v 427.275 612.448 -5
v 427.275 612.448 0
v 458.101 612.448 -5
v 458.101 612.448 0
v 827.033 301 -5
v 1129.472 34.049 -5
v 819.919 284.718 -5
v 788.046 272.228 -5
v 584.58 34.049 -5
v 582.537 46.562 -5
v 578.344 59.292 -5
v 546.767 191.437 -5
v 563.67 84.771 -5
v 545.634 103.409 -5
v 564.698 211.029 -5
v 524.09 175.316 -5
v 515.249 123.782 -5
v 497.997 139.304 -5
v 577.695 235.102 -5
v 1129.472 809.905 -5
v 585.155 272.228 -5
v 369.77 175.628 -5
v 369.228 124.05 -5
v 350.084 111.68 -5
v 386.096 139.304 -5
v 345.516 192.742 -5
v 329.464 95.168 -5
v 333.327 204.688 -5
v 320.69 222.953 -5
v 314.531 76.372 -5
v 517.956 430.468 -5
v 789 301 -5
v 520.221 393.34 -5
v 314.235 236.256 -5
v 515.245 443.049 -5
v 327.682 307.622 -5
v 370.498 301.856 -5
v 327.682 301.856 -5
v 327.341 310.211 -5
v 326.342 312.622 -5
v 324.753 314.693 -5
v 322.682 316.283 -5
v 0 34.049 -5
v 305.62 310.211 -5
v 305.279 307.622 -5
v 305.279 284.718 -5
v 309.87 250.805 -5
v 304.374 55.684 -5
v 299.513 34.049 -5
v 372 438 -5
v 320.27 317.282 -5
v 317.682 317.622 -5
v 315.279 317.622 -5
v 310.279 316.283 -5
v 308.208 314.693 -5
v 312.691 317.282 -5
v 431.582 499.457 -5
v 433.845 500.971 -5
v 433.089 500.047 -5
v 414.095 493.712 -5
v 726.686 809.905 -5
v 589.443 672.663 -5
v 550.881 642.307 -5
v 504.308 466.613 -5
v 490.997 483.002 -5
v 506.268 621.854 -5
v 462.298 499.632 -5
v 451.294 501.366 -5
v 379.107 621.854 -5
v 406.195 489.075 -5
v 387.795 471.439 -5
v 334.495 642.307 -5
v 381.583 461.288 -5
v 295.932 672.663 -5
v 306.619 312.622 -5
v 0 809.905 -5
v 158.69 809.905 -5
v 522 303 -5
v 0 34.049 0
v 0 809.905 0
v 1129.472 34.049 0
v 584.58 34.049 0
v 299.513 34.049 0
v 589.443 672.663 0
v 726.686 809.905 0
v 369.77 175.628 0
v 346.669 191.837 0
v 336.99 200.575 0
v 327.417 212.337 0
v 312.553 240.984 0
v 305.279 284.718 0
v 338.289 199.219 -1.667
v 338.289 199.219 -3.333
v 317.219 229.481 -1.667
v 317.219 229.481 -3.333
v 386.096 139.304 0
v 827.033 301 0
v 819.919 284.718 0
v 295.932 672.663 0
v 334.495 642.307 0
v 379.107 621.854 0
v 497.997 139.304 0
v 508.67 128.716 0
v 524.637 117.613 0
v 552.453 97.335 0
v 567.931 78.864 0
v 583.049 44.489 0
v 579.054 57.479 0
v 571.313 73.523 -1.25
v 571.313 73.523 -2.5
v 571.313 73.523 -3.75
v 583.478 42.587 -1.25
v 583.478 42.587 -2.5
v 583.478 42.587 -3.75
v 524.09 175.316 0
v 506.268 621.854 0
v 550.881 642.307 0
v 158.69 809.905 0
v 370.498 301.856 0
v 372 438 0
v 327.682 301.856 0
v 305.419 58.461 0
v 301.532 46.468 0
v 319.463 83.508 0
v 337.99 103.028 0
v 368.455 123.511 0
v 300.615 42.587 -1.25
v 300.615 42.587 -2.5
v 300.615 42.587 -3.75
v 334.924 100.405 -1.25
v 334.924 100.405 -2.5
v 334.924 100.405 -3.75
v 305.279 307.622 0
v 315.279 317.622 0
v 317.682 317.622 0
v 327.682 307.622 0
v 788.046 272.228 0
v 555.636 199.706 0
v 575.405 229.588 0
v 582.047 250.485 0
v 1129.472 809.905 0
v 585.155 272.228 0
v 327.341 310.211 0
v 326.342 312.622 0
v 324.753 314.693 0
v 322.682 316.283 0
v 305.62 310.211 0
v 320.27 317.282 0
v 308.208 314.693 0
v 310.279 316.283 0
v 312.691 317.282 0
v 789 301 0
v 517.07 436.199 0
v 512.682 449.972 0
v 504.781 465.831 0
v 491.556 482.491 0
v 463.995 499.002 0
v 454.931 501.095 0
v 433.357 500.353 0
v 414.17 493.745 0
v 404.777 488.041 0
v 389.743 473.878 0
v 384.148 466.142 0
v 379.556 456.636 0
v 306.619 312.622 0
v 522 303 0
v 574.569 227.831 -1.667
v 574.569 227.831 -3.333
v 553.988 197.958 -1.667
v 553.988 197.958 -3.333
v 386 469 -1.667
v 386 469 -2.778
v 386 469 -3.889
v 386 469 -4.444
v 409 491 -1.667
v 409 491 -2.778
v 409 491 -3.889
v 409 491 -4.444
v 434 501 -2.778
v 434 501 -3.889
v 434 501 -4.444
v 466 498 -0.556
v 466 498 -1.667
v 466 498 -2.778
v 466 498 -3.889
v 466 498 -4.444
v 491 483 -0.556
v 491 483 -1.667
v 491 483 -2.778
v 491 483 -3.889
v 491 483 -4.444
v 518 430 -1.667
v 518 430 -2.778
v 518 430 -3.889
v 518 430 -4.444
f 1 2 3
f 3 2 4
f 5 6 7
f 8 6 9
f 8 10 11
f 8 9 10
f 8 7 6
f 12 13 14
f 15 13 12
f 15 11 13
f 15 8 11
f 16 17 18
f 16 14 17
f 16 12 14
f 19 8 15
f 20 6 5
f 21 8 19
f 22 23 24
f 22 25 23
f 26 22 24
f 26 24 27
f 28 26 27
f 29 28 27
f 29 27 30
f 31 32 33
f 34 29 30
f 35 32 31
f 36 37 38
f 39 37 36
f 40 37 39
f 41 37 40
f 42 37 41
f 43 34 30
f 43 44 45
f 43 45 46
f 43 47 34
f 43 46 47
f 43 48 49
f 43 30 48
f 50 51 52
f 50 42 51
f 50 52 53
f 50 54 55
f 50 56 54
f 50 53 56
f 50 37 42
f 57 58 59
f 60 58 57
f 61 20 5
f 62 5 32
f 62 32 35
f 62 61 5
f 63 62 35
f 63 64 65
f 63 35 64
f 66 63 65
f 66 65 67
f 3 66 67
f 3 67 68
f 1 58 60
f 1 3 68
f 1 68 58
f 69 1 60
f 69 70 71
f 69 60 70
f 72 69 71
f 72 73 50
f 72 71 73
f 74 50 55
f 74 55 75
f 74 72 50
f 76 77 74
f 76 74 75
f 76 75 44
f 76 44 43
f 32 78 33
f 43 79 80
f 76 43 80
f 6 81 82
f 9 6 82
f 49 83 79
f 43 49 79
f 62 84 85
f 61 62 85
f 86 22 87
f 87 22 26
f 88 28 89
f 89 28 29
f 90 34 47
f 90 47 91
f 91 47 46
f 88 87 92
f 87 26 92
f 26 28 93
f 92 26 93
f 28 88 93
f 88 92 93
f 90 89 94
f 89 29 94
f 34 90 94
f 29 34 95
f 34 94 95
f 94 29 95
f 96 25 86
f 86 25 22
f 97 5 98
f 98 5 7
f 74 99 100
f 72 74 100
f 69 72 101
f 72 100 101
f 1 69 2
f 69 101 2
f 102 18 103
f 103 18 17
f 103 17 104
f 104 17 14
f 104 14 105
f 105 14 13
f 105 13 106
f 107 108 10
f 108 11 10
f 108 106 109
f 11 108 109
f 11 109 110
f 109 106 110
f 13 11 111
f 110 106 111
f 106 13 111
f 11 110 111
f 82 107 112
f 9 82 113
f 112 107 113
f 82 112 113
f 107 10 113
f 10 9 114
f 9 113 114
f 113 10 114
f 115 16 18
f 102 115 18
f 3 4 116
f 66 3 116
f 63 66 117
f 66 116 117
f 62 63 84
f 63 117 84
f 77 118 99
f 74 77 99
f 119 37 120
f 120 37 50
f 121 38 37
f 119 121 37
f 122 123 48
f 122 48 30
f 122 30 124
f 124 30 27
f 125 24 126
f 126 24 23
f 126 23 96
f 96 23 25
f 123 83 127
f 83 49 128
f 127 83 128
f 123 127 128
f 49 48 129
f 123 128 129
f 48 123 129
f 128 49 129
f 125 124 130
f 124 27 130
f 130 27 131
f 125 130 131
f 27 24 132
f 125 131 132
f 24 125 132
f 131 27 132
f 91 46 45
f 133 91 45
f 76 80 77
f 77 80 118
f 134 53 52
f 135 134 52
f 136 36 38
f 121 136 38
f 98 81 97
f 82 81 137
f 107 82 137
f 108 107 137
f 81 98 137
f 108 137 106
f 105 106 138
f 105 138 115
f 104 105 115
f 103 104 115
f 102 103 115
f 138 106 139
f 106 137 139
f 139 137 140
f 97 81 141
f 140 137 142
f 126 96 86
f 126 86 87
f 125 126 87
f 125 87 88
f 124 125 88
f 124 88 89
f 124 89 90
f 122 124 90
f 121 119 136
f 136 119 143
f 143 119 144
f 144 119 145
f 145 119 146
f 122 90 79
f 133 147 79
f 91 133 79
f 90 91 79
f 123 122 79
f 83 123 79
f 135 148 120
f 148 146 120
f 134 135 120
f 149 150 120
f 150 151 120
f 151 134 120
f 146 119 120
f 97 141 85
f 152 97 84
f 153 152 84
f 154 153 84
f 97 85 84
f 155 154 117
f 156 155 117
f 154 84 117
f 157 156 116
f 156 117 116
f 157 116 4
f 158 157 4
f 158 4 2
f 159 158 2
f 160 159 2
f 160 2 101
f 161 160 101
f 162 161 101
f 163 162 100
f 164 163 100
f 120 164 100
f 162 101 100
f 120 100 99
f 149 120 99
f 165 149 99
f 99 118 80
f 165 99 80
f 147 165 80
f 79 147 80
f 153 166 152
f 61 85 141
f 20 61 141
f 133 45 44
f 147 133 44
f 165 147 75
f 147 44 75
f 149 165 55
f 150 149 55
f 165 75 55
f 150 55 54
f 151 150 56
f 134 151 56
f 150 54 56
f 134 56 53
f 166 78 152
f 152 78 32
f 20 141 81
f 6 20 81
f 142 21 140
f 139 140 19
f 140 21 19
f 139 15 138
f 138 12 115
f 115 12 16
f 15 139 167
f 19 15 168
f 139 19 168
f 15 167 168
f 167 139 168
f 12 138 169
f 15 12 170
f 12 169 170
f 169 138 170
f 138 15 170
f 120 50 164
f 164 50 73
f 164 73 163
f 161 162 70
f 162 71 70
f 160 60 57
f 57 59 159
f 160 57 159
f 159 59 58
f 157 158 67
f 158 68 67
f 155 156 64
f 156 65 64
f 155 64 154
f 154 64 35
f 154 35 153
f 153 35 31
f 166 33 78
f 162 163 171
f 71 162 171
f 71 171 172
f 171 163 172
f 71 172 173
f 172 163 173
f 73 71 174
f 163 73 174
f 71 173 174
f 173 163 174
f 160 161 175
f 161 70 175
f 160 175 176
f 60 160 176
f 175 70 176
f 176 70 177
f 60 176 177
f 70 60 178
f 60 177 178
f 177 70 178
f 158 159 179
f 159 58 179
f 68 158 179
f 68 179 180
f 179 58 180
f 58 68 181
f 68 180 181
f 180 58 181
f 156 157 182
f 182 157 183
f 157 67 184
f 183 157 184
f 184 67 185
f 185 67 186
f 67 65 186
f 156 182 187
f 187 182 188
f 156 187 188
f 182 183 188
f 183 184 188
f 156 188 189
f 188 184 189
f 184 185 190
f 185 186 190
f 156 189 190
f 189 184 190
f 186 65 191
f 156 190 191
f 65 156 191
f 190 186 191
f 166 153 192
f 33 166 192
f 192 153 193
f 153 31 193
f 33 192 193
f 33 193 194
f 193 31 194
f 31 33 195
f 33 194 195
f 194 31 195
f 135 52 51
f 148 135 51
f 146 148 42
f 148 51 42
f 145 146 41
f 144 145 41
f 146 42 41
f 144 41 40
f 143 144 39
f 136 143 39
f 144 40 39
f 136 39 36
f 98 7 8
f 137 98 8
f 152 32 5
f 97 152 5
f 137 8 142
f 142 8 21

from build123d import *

# Parameters (mm, degrees)
BOSS_EXTRUDE1_DEPTH = 5
BOSS_EXTRUDE2_DEPTH = 5
CUT_EXTRUDE1_DEPTH  = 10


with BuildPart() as part:
    # Sketch1 → Boss-Extrude1 (new body)
    with BuildSketch(Plane.XY):
        with BuildLine():
            Line((370.497648791, 301.856182559), (372, 438))
            add(Edge.make_bspline(
                [(372, 438), (377.070612499, 448.141224997), (379.461430827, 459.737027004), (386, 469), (392.118159092, 477.667392046), (400.143712739, 485.158619041), (409, 491), (416.132300897, 495.704283571), (425.067091676, 496.82683667), (433, 500), (433.43768811, 500.175075244), (433.528840556, 501.015198692), (434, 501), (438.494427227, 500.855018477), (456.988046274, 503.340417023), (466, 498), (474.360530914, 493.04561131), (483.793567573, 489.520105529), (491, 483), (498.069480611, 476.603803257), (503.672468408, 468.494784236), (508, 460), (512.78479786, 450.607619016), (517.063759809, 440.499264994), (518, 430), (521.761891843, 387.813070049), (520.666666667, 345.333333333), (522, 303)],
                knots=[0, 0, 0, 0, 1, 1, 1, 2, 2, 2, 3, 3, 3, 4, 4, 4, 5, 5, 5, 6, 6, 6, 7, 7, 7, 8, 8, 8, 9, 9, 9, 9], degree=3))
            Line((522, 303), (789, 301))
            Line((789, 301), (827.03280719, 301))
            Line((827.03280719, 301), (819.918923577, 284.71793746))
            Line((819.918923577, 284.71793746), (788.046411506, 272.228043202))
            Line((788.046411506, 272.228043202), (585.155364104, 272.228043202))
            add(Edge.make_bspline(
                [(524.090153556, 175.31625705), (534.132772767, 182.776976105), (545.301104031, 188.967808356), (553.987887853, 197.958010428), (562.390275972, 206.653883218), (569.231762232, 216.980387762), (574.568753191, 227.830957202), (581.280416418, 241.476355602), (583.659025907, 256.921583072), (585.155364104, 272.228043202)],
                knots=[0.030911268, 0.030911268, 0.030911268, 0.030911268, 1, 1, 1, 2, 2, 2, 2.820581713, 2.820581713, 2.820581713, 2.820581713], degree=3))
            Line((524.090153556, 175.31625705), (497.996656044, 139.304186189))
            add(Edge.make_bspline(
                [(497.996656044, 139.304186189), (511.751798598, 122.15158093), (533.207187644, 114.760213321), (549.168786654, 100.404628372), (557.800622493, 92.641305125), (565.388182046, 83.506408445), (571.312683203, 73.52251823), (576.967291515, 63.993447834), (581.146310668, 53.41944041), (583.478086888, 42.587053902), (585.653758103, 32.479861233), (584.25512728, 21.924242773), (584.643647475, 11.592837208)],
                knots=[-0.601084915, -0.601084915, -0.601084915, -0.601084915, 1, 1, 1, 2, 2, 2, 3, 3, 3, 4, 4, 4, 4], degree=3))
            Line((584.643647475, 11.592837208), (537.046411506, 5.228043202))
            Line((537.046411506, 5.228043202), (347.046411506, 5.228043202))
            Line((347.046411506, 5.228043202), (299.449175536, 11.592837208))
            add(Edge.make_bspline(
                [(386.096166967, 139.304186189), (372.341024413, 122.15158093), (350.885635367, 114.760213321), (334.924036357, 100.404628372), (326.292200518, 92.641305125), (318.704640966, 83.506408445), (312.780139808, 73.52251823), (307.125531496, 63.993447834), (302.946512343, 53.41944041), (300.614736124, 42.587053902), (298.439064908, 32.479861233), (299.837695732, 21.924242773), (299.449175536, 11.592837208)],
                knots=[-0.601084915, -0.601084915, -0.601084915, -0.601084915, 1, 1, 1, 2, 2, 2, 3, 3, 3, 4, 4, 4, 4], degree=3))
            Line((386.096166967, 139.304186189), (369.769696723, 175.6280686))
            add(Edge.make_bspline(
                [(369.769696723, 175.6280686), (359.275993543, 183.491550102), (347.446772756, 189.833430008), (338.288587183, 199.218513107), (329.704053525, 208.015731849), (322.698000121, 218.47829637), (317.218632515, 229.481105391), (308.82128178, 246.343351742), (306.951710973, 265.954847126), (305.27920015, 284.71793746)],
                knots=[0, 0, 0, 0, 1, 1, 1, 2, 2, 2, 3, 3, 3, 3], degree=3))
            Line((305.27920015, 284.71793746), (305.27920015, 294.71793746))
            Line((305.27920015, 294.71793746), (305.27920015, 307.622403638))
            ThreePointArc((305.27920015, 307.622403638), (308.208132338, 314.69347145), (315.27920015, 317.622403638))
            Line((315.27920015, 317.622403638), (317.681970552, 317.622403638))
            ThreePointArc((317.681970552, 317.622403638), (324.753038364, 314.69347145), (327.681970552, 307.622403638))
            Line((327.681970552, 307.622403638), (327.681970552, 301.856182559))
            Line((327.681970552, 301.856182559), (370.497648791, 301.856182559))
        make_face()
        with BuildLine():
            ThreePointArc((406.611213578, 432.933993488), (444.240513417, 427.999983531), (481.869813256, 432.933993488))
            ThreePointArc((481.869813256, 432.933993488), (487.373843498, 425.711519852), (481.869813256, 418.489046215))
            ThreePointArc((481.869813256, 418.489046215), (444.240513417, 413.999983531), (406.611213578, 418.489046215))
            ThreePointArc((406.611213578, 418.489046215), (401.107183337, 425.711519852), (406.611213578, 432.933993488))
        make_face(mode=Mode.SUBTRACT)
        with BuildLine():
            ThreePointArc((406.611213578, 398), (444.240513417, 393.065990043), (481.869813256, 398))
            ThreePointArc((481.869813256, 398), (487.373843498, 390.777526364), (481.869813256, 383.555052727))
            ThreePointArc((481.869813256, 383.555052727), (444.240513417, 379.065990043), (406.611213578, 383.555052727))
            ThreePointArc((406.611213578, 383.555052727), (401.107183337, 390.777526364), (406.611213578, 398))
        make_face(mode=Mode.SUBTRACT)
        with BuildLine():
            ThreePointArc((406.611213578, 363.066006512), (444.240513417, 358.131996555), (481.869813256, 363.066006512))
            ThreePointArc((481.869813256, 363.066006512), (487.373843498, 355.843532875), (481.869813256, 348.621059239))
            ThreePointArc((481.869813256, 348.621059239), (444.240513417, 344.131996555), (406.611213578, 348.621059239))
            ThreePointArc((406.611213578, 348.621059239), (401.107183337, 355.843532875), (406.611213578, 363.066006512))
        make_face(mode=Mode.SUBTRACT)
    extrude(amount=-BOSS_EXTRUDE1_DEPTH)

    # SurfaceCut1: cut with a surface, the side behind it stays


with BuildPart() as body_2:
    # Sketch4 → Boss-Extrude2 (new body)
    with BuildSketch(Plane.XY):
        with BuildLine():
            Line((0, 809.905385878), (158.689577265, 809.905385878))
            Line((158.689577265, 809.905385878), (295.931975359, 672.662987784))
            ThreePointArc((295.931975359, 672.662987784), (356.194111544, 630.756728958), (427.274671247, 612.447889054))
            Line((427.274671247, 612.447889054), (458.100697152, 612.447889054))
            ThreePointArc((458.100697152, 612.447889054), (529.181256855, 630.756728958), (589.44339304, 672.662987784))
            Line((589.44339304, 672.662987784), (726.685791134, 809.905385878))
            Line((726.685791134, 809.905385878), (1129.472339378, 809.905385878))
            Line((1129.472339378, 809.905385878), (1129.472339378, 34.048851959))
            Line((1129.472339378, 34.048851959), (0, 34.048851959))
            Line((0, 34.048851959), (0, 809.905385878))
        make_face()
    extrude(amount=-BOSS_EXTRUDE2_DEPTH)


with BuildPart() as part_1:
    add(part.part)
    # Surface-Offset1: a surface, a copy of 1 face of the part
    surface_offset1_1 = body_2.part.faces().sort_by_distance((564.736169689, 34.048851959, -2.5))[0]
    split(bisect_by=surface_offset1_1, keep=Keep.BOTTOM)


with BuildPart() as cut_extrude1_tool:
    # Sketch5 → Cut-Extrude1 (new body)
    with BuildSketch(Plane(origin=(0, 0, -5), x_dir=(-1, 0, 0), z_dir=(0, 0, -1))):
        with BuildLine():
            Line((-305.27920015, 294.71793746), (-305.27920015, 307.622403638))
            ThreePointArc((-305.27920015, 307.622403638), (-308.208132338, 314.69347145), (-315.27920015, 317.622403638))
            Line((-315.27920015, 317.622403638), (-317.681970552, 317.622403638))
            ThreePointArc((-317.681970552, 317.622403638), (-324.753038364, 314.69347145), (-327.681970552, 307.622403638))
            Line((-327.681970552, 307.622403638), (-327.681970552, 301.856182559))
            Line((-327.681970552, 301.856182559), (-370.497648791, 301.856182559))
            Line((-370.497648791, 301.856182559), (-372, 438))
            add(Edge.make_bspline(
                [(-372, 438), (-377.070612499, 448.141224997), (-379.461430827, 459.737027004), (-386, 469), (-392.118159092, 477.667392046), (-400.143712739, 485.158619041), (-409, 491), (-416.132300897, 495.704283571), (-425.067091676, 496.82683667), (-433, 500), (-433.43768811, 500.175075244), (-433.528840556, 501.015198692), (-434, 501), (-438.494427227, 500.855018477), (-456.988046274, 503.340417023), (-466, 498), (-474.360530914, 493.04561131), (-483.793567573, 489.520105529), (-491, 483), (-498.069480611, 476.603803257), (-503.672468408, 468.494784236), (-508, 460), (-512.78479786, 450.607619016), (-517.063759809, 440.499264994), (-518, 430), (-521.761891843, 387.813070049), (-520.666666667, 345.333333333), (-522, 303)],
                knots=[0, 0, 0, 0, 1, 1, 1, 2, 2, 2, 3, 3, 3, 4, 4, 4, 5, 5, 5, 6, 6, 6, 7, 7, 7, 8, 8, 8, 9, 9, 9, 9], degree=3))
            Line((-522, 303), (-789, 301))
            Line((-789, 301), (-827.03280719, 301))
            Line((-827.03280719, 301), (-819.918923577, 284.71793746))
            Line((-819.918923577, 284.71793746), (-788.046411506, 272.228043202))
            Line((-788.046411506, 272.228043202), (-585.155364104, 272.228043202))
            add(Edge.make_bspline(
                [(-585.155364104, 272.228043202), (-583.659025907, 256.921583072), (-581.280416418, 241.476355602), (-574.568753191, 227.830957202), (-569.231762232, 216.980387762), (-562.390275972, 206.653883218), (-553.987887853, 197.958010428), (-545.301104031, 188.967808356), (-534.132772767, 182.776976105), (-524.090153556, 175.31625705)],
                knots=[0.030911268, 0.030911268, 0.030911268, 0.030911268, 0.851492981, 0.851492981, 0.851492981, 1.851492981, 1.851492981, 1.851492981, 2.820581713, 2.820581713, 2.820581713, 2.820581713], degree=3))
            Line((-524.090153556, 175.31625705), (-497.996656044, 139.304186189))
            add(Edge.make_bspline(
                [(-497.996656044, 139.304186189), (-511.751798598, 122.15158093), (-533.207187644, 114.760213321), (-549.168786654, 100.404628372), (-557.800622493, 92.641305125), (-565.388182046, 83.506408445), (-571.312683203, 73.52251823), (-576.967291515, 63.993447834), (-581.146310668, 53.41944041), (-583.478086888, 42.587053902), (-585.653758103, 32.479861233), (-584.25512728, 21.924242773), (-584.643647475, 11.592837208)],
                knots=[-0.601084915, -0.601084915, -0.601084915, -0.601084915, 1, 1, 1, 2, 2, 2, 3, 3, 3, 4, 4, 4, 4], degree=3))
            Line((-584.643647475, 11.592837208), (-537.046411506, 5.228043202))
            Line((-537.046411506, 5.228043202), (-347.046411506, 5.228043202))
            Line((-347.046411506, 5.228043202), (-299.449175536, 11.592837208))
            add(Edge.make_bspline(
                [(-299.449175536, 11.592837208), (-299.837695732, 21.924242773), (-298.439064908, 32.479861233), (-300.614736124, 42.587053902), (-302.946512343, 53.41944041), (-307.125531496, 63.993447834), (-312.780139808, 73.52251823), (-318.704640966, 83.506408445), (-326.292200518, 92.641305125), (-334.924036357, 100.404628372), (-350.885635367, 114.760213321), (-372.341024413, 122.15158093), (-386.096166967, 139.304186189)],
                knots=[-0.601084915, -0.601084915, -0.601084915, -0.601084915, 0.398915085, 0.398915085, 0.398915085, 1.398915085, 1.398915085, 1.398915085, 2.398915085, 2.398915085, 2.398915085, 4, 4, 4, 4], degree=3))
            Line((-386.096166967, 139.304186189), (-369.769696723, 175.6280686))
            add(Edge.make_bspline(
                [(-369.769696723, 175.6280686), (-359.275993543, 183.491550102), (-347.446772756, 189.833430008), (-338.288587183, 199.218513107), (-329.704053525, 208.015731849), (-322.698000121, 218.47829637), (-317.218632515, 229.481105391), (-308.82128178, 246.343351742), (-306.951710973, 265.954847126), (-305.27920015, 284.71793746)],
                knots=[0, 0, 0, 0, 1, 1, 1, 2, 2, 2, 3, 3, 3, 3], degree=3))
            Line((-305.27920015, 284.71793746), (-305.27920015, 294.71793746))
        make_face()
    extrude(amount=-CUT_EXTRUDE1_DEPTH)


with BuildPart() as part_2:
    add(part_1.part)

    # Cut-Extrude1: cut by cut_extrude1_tool
    add(cut_extrude1_tool.part, mode=Mode.SUBTRACT)


with BuildPart() as body_2_1:
    add(body_2.part)

    # Cut-Extrude1: cut by cut_extrude1_tool
    add(cut_extrude1_tool.part, mode=Mode.SUBTRACT)


solid = body_2_1.part
